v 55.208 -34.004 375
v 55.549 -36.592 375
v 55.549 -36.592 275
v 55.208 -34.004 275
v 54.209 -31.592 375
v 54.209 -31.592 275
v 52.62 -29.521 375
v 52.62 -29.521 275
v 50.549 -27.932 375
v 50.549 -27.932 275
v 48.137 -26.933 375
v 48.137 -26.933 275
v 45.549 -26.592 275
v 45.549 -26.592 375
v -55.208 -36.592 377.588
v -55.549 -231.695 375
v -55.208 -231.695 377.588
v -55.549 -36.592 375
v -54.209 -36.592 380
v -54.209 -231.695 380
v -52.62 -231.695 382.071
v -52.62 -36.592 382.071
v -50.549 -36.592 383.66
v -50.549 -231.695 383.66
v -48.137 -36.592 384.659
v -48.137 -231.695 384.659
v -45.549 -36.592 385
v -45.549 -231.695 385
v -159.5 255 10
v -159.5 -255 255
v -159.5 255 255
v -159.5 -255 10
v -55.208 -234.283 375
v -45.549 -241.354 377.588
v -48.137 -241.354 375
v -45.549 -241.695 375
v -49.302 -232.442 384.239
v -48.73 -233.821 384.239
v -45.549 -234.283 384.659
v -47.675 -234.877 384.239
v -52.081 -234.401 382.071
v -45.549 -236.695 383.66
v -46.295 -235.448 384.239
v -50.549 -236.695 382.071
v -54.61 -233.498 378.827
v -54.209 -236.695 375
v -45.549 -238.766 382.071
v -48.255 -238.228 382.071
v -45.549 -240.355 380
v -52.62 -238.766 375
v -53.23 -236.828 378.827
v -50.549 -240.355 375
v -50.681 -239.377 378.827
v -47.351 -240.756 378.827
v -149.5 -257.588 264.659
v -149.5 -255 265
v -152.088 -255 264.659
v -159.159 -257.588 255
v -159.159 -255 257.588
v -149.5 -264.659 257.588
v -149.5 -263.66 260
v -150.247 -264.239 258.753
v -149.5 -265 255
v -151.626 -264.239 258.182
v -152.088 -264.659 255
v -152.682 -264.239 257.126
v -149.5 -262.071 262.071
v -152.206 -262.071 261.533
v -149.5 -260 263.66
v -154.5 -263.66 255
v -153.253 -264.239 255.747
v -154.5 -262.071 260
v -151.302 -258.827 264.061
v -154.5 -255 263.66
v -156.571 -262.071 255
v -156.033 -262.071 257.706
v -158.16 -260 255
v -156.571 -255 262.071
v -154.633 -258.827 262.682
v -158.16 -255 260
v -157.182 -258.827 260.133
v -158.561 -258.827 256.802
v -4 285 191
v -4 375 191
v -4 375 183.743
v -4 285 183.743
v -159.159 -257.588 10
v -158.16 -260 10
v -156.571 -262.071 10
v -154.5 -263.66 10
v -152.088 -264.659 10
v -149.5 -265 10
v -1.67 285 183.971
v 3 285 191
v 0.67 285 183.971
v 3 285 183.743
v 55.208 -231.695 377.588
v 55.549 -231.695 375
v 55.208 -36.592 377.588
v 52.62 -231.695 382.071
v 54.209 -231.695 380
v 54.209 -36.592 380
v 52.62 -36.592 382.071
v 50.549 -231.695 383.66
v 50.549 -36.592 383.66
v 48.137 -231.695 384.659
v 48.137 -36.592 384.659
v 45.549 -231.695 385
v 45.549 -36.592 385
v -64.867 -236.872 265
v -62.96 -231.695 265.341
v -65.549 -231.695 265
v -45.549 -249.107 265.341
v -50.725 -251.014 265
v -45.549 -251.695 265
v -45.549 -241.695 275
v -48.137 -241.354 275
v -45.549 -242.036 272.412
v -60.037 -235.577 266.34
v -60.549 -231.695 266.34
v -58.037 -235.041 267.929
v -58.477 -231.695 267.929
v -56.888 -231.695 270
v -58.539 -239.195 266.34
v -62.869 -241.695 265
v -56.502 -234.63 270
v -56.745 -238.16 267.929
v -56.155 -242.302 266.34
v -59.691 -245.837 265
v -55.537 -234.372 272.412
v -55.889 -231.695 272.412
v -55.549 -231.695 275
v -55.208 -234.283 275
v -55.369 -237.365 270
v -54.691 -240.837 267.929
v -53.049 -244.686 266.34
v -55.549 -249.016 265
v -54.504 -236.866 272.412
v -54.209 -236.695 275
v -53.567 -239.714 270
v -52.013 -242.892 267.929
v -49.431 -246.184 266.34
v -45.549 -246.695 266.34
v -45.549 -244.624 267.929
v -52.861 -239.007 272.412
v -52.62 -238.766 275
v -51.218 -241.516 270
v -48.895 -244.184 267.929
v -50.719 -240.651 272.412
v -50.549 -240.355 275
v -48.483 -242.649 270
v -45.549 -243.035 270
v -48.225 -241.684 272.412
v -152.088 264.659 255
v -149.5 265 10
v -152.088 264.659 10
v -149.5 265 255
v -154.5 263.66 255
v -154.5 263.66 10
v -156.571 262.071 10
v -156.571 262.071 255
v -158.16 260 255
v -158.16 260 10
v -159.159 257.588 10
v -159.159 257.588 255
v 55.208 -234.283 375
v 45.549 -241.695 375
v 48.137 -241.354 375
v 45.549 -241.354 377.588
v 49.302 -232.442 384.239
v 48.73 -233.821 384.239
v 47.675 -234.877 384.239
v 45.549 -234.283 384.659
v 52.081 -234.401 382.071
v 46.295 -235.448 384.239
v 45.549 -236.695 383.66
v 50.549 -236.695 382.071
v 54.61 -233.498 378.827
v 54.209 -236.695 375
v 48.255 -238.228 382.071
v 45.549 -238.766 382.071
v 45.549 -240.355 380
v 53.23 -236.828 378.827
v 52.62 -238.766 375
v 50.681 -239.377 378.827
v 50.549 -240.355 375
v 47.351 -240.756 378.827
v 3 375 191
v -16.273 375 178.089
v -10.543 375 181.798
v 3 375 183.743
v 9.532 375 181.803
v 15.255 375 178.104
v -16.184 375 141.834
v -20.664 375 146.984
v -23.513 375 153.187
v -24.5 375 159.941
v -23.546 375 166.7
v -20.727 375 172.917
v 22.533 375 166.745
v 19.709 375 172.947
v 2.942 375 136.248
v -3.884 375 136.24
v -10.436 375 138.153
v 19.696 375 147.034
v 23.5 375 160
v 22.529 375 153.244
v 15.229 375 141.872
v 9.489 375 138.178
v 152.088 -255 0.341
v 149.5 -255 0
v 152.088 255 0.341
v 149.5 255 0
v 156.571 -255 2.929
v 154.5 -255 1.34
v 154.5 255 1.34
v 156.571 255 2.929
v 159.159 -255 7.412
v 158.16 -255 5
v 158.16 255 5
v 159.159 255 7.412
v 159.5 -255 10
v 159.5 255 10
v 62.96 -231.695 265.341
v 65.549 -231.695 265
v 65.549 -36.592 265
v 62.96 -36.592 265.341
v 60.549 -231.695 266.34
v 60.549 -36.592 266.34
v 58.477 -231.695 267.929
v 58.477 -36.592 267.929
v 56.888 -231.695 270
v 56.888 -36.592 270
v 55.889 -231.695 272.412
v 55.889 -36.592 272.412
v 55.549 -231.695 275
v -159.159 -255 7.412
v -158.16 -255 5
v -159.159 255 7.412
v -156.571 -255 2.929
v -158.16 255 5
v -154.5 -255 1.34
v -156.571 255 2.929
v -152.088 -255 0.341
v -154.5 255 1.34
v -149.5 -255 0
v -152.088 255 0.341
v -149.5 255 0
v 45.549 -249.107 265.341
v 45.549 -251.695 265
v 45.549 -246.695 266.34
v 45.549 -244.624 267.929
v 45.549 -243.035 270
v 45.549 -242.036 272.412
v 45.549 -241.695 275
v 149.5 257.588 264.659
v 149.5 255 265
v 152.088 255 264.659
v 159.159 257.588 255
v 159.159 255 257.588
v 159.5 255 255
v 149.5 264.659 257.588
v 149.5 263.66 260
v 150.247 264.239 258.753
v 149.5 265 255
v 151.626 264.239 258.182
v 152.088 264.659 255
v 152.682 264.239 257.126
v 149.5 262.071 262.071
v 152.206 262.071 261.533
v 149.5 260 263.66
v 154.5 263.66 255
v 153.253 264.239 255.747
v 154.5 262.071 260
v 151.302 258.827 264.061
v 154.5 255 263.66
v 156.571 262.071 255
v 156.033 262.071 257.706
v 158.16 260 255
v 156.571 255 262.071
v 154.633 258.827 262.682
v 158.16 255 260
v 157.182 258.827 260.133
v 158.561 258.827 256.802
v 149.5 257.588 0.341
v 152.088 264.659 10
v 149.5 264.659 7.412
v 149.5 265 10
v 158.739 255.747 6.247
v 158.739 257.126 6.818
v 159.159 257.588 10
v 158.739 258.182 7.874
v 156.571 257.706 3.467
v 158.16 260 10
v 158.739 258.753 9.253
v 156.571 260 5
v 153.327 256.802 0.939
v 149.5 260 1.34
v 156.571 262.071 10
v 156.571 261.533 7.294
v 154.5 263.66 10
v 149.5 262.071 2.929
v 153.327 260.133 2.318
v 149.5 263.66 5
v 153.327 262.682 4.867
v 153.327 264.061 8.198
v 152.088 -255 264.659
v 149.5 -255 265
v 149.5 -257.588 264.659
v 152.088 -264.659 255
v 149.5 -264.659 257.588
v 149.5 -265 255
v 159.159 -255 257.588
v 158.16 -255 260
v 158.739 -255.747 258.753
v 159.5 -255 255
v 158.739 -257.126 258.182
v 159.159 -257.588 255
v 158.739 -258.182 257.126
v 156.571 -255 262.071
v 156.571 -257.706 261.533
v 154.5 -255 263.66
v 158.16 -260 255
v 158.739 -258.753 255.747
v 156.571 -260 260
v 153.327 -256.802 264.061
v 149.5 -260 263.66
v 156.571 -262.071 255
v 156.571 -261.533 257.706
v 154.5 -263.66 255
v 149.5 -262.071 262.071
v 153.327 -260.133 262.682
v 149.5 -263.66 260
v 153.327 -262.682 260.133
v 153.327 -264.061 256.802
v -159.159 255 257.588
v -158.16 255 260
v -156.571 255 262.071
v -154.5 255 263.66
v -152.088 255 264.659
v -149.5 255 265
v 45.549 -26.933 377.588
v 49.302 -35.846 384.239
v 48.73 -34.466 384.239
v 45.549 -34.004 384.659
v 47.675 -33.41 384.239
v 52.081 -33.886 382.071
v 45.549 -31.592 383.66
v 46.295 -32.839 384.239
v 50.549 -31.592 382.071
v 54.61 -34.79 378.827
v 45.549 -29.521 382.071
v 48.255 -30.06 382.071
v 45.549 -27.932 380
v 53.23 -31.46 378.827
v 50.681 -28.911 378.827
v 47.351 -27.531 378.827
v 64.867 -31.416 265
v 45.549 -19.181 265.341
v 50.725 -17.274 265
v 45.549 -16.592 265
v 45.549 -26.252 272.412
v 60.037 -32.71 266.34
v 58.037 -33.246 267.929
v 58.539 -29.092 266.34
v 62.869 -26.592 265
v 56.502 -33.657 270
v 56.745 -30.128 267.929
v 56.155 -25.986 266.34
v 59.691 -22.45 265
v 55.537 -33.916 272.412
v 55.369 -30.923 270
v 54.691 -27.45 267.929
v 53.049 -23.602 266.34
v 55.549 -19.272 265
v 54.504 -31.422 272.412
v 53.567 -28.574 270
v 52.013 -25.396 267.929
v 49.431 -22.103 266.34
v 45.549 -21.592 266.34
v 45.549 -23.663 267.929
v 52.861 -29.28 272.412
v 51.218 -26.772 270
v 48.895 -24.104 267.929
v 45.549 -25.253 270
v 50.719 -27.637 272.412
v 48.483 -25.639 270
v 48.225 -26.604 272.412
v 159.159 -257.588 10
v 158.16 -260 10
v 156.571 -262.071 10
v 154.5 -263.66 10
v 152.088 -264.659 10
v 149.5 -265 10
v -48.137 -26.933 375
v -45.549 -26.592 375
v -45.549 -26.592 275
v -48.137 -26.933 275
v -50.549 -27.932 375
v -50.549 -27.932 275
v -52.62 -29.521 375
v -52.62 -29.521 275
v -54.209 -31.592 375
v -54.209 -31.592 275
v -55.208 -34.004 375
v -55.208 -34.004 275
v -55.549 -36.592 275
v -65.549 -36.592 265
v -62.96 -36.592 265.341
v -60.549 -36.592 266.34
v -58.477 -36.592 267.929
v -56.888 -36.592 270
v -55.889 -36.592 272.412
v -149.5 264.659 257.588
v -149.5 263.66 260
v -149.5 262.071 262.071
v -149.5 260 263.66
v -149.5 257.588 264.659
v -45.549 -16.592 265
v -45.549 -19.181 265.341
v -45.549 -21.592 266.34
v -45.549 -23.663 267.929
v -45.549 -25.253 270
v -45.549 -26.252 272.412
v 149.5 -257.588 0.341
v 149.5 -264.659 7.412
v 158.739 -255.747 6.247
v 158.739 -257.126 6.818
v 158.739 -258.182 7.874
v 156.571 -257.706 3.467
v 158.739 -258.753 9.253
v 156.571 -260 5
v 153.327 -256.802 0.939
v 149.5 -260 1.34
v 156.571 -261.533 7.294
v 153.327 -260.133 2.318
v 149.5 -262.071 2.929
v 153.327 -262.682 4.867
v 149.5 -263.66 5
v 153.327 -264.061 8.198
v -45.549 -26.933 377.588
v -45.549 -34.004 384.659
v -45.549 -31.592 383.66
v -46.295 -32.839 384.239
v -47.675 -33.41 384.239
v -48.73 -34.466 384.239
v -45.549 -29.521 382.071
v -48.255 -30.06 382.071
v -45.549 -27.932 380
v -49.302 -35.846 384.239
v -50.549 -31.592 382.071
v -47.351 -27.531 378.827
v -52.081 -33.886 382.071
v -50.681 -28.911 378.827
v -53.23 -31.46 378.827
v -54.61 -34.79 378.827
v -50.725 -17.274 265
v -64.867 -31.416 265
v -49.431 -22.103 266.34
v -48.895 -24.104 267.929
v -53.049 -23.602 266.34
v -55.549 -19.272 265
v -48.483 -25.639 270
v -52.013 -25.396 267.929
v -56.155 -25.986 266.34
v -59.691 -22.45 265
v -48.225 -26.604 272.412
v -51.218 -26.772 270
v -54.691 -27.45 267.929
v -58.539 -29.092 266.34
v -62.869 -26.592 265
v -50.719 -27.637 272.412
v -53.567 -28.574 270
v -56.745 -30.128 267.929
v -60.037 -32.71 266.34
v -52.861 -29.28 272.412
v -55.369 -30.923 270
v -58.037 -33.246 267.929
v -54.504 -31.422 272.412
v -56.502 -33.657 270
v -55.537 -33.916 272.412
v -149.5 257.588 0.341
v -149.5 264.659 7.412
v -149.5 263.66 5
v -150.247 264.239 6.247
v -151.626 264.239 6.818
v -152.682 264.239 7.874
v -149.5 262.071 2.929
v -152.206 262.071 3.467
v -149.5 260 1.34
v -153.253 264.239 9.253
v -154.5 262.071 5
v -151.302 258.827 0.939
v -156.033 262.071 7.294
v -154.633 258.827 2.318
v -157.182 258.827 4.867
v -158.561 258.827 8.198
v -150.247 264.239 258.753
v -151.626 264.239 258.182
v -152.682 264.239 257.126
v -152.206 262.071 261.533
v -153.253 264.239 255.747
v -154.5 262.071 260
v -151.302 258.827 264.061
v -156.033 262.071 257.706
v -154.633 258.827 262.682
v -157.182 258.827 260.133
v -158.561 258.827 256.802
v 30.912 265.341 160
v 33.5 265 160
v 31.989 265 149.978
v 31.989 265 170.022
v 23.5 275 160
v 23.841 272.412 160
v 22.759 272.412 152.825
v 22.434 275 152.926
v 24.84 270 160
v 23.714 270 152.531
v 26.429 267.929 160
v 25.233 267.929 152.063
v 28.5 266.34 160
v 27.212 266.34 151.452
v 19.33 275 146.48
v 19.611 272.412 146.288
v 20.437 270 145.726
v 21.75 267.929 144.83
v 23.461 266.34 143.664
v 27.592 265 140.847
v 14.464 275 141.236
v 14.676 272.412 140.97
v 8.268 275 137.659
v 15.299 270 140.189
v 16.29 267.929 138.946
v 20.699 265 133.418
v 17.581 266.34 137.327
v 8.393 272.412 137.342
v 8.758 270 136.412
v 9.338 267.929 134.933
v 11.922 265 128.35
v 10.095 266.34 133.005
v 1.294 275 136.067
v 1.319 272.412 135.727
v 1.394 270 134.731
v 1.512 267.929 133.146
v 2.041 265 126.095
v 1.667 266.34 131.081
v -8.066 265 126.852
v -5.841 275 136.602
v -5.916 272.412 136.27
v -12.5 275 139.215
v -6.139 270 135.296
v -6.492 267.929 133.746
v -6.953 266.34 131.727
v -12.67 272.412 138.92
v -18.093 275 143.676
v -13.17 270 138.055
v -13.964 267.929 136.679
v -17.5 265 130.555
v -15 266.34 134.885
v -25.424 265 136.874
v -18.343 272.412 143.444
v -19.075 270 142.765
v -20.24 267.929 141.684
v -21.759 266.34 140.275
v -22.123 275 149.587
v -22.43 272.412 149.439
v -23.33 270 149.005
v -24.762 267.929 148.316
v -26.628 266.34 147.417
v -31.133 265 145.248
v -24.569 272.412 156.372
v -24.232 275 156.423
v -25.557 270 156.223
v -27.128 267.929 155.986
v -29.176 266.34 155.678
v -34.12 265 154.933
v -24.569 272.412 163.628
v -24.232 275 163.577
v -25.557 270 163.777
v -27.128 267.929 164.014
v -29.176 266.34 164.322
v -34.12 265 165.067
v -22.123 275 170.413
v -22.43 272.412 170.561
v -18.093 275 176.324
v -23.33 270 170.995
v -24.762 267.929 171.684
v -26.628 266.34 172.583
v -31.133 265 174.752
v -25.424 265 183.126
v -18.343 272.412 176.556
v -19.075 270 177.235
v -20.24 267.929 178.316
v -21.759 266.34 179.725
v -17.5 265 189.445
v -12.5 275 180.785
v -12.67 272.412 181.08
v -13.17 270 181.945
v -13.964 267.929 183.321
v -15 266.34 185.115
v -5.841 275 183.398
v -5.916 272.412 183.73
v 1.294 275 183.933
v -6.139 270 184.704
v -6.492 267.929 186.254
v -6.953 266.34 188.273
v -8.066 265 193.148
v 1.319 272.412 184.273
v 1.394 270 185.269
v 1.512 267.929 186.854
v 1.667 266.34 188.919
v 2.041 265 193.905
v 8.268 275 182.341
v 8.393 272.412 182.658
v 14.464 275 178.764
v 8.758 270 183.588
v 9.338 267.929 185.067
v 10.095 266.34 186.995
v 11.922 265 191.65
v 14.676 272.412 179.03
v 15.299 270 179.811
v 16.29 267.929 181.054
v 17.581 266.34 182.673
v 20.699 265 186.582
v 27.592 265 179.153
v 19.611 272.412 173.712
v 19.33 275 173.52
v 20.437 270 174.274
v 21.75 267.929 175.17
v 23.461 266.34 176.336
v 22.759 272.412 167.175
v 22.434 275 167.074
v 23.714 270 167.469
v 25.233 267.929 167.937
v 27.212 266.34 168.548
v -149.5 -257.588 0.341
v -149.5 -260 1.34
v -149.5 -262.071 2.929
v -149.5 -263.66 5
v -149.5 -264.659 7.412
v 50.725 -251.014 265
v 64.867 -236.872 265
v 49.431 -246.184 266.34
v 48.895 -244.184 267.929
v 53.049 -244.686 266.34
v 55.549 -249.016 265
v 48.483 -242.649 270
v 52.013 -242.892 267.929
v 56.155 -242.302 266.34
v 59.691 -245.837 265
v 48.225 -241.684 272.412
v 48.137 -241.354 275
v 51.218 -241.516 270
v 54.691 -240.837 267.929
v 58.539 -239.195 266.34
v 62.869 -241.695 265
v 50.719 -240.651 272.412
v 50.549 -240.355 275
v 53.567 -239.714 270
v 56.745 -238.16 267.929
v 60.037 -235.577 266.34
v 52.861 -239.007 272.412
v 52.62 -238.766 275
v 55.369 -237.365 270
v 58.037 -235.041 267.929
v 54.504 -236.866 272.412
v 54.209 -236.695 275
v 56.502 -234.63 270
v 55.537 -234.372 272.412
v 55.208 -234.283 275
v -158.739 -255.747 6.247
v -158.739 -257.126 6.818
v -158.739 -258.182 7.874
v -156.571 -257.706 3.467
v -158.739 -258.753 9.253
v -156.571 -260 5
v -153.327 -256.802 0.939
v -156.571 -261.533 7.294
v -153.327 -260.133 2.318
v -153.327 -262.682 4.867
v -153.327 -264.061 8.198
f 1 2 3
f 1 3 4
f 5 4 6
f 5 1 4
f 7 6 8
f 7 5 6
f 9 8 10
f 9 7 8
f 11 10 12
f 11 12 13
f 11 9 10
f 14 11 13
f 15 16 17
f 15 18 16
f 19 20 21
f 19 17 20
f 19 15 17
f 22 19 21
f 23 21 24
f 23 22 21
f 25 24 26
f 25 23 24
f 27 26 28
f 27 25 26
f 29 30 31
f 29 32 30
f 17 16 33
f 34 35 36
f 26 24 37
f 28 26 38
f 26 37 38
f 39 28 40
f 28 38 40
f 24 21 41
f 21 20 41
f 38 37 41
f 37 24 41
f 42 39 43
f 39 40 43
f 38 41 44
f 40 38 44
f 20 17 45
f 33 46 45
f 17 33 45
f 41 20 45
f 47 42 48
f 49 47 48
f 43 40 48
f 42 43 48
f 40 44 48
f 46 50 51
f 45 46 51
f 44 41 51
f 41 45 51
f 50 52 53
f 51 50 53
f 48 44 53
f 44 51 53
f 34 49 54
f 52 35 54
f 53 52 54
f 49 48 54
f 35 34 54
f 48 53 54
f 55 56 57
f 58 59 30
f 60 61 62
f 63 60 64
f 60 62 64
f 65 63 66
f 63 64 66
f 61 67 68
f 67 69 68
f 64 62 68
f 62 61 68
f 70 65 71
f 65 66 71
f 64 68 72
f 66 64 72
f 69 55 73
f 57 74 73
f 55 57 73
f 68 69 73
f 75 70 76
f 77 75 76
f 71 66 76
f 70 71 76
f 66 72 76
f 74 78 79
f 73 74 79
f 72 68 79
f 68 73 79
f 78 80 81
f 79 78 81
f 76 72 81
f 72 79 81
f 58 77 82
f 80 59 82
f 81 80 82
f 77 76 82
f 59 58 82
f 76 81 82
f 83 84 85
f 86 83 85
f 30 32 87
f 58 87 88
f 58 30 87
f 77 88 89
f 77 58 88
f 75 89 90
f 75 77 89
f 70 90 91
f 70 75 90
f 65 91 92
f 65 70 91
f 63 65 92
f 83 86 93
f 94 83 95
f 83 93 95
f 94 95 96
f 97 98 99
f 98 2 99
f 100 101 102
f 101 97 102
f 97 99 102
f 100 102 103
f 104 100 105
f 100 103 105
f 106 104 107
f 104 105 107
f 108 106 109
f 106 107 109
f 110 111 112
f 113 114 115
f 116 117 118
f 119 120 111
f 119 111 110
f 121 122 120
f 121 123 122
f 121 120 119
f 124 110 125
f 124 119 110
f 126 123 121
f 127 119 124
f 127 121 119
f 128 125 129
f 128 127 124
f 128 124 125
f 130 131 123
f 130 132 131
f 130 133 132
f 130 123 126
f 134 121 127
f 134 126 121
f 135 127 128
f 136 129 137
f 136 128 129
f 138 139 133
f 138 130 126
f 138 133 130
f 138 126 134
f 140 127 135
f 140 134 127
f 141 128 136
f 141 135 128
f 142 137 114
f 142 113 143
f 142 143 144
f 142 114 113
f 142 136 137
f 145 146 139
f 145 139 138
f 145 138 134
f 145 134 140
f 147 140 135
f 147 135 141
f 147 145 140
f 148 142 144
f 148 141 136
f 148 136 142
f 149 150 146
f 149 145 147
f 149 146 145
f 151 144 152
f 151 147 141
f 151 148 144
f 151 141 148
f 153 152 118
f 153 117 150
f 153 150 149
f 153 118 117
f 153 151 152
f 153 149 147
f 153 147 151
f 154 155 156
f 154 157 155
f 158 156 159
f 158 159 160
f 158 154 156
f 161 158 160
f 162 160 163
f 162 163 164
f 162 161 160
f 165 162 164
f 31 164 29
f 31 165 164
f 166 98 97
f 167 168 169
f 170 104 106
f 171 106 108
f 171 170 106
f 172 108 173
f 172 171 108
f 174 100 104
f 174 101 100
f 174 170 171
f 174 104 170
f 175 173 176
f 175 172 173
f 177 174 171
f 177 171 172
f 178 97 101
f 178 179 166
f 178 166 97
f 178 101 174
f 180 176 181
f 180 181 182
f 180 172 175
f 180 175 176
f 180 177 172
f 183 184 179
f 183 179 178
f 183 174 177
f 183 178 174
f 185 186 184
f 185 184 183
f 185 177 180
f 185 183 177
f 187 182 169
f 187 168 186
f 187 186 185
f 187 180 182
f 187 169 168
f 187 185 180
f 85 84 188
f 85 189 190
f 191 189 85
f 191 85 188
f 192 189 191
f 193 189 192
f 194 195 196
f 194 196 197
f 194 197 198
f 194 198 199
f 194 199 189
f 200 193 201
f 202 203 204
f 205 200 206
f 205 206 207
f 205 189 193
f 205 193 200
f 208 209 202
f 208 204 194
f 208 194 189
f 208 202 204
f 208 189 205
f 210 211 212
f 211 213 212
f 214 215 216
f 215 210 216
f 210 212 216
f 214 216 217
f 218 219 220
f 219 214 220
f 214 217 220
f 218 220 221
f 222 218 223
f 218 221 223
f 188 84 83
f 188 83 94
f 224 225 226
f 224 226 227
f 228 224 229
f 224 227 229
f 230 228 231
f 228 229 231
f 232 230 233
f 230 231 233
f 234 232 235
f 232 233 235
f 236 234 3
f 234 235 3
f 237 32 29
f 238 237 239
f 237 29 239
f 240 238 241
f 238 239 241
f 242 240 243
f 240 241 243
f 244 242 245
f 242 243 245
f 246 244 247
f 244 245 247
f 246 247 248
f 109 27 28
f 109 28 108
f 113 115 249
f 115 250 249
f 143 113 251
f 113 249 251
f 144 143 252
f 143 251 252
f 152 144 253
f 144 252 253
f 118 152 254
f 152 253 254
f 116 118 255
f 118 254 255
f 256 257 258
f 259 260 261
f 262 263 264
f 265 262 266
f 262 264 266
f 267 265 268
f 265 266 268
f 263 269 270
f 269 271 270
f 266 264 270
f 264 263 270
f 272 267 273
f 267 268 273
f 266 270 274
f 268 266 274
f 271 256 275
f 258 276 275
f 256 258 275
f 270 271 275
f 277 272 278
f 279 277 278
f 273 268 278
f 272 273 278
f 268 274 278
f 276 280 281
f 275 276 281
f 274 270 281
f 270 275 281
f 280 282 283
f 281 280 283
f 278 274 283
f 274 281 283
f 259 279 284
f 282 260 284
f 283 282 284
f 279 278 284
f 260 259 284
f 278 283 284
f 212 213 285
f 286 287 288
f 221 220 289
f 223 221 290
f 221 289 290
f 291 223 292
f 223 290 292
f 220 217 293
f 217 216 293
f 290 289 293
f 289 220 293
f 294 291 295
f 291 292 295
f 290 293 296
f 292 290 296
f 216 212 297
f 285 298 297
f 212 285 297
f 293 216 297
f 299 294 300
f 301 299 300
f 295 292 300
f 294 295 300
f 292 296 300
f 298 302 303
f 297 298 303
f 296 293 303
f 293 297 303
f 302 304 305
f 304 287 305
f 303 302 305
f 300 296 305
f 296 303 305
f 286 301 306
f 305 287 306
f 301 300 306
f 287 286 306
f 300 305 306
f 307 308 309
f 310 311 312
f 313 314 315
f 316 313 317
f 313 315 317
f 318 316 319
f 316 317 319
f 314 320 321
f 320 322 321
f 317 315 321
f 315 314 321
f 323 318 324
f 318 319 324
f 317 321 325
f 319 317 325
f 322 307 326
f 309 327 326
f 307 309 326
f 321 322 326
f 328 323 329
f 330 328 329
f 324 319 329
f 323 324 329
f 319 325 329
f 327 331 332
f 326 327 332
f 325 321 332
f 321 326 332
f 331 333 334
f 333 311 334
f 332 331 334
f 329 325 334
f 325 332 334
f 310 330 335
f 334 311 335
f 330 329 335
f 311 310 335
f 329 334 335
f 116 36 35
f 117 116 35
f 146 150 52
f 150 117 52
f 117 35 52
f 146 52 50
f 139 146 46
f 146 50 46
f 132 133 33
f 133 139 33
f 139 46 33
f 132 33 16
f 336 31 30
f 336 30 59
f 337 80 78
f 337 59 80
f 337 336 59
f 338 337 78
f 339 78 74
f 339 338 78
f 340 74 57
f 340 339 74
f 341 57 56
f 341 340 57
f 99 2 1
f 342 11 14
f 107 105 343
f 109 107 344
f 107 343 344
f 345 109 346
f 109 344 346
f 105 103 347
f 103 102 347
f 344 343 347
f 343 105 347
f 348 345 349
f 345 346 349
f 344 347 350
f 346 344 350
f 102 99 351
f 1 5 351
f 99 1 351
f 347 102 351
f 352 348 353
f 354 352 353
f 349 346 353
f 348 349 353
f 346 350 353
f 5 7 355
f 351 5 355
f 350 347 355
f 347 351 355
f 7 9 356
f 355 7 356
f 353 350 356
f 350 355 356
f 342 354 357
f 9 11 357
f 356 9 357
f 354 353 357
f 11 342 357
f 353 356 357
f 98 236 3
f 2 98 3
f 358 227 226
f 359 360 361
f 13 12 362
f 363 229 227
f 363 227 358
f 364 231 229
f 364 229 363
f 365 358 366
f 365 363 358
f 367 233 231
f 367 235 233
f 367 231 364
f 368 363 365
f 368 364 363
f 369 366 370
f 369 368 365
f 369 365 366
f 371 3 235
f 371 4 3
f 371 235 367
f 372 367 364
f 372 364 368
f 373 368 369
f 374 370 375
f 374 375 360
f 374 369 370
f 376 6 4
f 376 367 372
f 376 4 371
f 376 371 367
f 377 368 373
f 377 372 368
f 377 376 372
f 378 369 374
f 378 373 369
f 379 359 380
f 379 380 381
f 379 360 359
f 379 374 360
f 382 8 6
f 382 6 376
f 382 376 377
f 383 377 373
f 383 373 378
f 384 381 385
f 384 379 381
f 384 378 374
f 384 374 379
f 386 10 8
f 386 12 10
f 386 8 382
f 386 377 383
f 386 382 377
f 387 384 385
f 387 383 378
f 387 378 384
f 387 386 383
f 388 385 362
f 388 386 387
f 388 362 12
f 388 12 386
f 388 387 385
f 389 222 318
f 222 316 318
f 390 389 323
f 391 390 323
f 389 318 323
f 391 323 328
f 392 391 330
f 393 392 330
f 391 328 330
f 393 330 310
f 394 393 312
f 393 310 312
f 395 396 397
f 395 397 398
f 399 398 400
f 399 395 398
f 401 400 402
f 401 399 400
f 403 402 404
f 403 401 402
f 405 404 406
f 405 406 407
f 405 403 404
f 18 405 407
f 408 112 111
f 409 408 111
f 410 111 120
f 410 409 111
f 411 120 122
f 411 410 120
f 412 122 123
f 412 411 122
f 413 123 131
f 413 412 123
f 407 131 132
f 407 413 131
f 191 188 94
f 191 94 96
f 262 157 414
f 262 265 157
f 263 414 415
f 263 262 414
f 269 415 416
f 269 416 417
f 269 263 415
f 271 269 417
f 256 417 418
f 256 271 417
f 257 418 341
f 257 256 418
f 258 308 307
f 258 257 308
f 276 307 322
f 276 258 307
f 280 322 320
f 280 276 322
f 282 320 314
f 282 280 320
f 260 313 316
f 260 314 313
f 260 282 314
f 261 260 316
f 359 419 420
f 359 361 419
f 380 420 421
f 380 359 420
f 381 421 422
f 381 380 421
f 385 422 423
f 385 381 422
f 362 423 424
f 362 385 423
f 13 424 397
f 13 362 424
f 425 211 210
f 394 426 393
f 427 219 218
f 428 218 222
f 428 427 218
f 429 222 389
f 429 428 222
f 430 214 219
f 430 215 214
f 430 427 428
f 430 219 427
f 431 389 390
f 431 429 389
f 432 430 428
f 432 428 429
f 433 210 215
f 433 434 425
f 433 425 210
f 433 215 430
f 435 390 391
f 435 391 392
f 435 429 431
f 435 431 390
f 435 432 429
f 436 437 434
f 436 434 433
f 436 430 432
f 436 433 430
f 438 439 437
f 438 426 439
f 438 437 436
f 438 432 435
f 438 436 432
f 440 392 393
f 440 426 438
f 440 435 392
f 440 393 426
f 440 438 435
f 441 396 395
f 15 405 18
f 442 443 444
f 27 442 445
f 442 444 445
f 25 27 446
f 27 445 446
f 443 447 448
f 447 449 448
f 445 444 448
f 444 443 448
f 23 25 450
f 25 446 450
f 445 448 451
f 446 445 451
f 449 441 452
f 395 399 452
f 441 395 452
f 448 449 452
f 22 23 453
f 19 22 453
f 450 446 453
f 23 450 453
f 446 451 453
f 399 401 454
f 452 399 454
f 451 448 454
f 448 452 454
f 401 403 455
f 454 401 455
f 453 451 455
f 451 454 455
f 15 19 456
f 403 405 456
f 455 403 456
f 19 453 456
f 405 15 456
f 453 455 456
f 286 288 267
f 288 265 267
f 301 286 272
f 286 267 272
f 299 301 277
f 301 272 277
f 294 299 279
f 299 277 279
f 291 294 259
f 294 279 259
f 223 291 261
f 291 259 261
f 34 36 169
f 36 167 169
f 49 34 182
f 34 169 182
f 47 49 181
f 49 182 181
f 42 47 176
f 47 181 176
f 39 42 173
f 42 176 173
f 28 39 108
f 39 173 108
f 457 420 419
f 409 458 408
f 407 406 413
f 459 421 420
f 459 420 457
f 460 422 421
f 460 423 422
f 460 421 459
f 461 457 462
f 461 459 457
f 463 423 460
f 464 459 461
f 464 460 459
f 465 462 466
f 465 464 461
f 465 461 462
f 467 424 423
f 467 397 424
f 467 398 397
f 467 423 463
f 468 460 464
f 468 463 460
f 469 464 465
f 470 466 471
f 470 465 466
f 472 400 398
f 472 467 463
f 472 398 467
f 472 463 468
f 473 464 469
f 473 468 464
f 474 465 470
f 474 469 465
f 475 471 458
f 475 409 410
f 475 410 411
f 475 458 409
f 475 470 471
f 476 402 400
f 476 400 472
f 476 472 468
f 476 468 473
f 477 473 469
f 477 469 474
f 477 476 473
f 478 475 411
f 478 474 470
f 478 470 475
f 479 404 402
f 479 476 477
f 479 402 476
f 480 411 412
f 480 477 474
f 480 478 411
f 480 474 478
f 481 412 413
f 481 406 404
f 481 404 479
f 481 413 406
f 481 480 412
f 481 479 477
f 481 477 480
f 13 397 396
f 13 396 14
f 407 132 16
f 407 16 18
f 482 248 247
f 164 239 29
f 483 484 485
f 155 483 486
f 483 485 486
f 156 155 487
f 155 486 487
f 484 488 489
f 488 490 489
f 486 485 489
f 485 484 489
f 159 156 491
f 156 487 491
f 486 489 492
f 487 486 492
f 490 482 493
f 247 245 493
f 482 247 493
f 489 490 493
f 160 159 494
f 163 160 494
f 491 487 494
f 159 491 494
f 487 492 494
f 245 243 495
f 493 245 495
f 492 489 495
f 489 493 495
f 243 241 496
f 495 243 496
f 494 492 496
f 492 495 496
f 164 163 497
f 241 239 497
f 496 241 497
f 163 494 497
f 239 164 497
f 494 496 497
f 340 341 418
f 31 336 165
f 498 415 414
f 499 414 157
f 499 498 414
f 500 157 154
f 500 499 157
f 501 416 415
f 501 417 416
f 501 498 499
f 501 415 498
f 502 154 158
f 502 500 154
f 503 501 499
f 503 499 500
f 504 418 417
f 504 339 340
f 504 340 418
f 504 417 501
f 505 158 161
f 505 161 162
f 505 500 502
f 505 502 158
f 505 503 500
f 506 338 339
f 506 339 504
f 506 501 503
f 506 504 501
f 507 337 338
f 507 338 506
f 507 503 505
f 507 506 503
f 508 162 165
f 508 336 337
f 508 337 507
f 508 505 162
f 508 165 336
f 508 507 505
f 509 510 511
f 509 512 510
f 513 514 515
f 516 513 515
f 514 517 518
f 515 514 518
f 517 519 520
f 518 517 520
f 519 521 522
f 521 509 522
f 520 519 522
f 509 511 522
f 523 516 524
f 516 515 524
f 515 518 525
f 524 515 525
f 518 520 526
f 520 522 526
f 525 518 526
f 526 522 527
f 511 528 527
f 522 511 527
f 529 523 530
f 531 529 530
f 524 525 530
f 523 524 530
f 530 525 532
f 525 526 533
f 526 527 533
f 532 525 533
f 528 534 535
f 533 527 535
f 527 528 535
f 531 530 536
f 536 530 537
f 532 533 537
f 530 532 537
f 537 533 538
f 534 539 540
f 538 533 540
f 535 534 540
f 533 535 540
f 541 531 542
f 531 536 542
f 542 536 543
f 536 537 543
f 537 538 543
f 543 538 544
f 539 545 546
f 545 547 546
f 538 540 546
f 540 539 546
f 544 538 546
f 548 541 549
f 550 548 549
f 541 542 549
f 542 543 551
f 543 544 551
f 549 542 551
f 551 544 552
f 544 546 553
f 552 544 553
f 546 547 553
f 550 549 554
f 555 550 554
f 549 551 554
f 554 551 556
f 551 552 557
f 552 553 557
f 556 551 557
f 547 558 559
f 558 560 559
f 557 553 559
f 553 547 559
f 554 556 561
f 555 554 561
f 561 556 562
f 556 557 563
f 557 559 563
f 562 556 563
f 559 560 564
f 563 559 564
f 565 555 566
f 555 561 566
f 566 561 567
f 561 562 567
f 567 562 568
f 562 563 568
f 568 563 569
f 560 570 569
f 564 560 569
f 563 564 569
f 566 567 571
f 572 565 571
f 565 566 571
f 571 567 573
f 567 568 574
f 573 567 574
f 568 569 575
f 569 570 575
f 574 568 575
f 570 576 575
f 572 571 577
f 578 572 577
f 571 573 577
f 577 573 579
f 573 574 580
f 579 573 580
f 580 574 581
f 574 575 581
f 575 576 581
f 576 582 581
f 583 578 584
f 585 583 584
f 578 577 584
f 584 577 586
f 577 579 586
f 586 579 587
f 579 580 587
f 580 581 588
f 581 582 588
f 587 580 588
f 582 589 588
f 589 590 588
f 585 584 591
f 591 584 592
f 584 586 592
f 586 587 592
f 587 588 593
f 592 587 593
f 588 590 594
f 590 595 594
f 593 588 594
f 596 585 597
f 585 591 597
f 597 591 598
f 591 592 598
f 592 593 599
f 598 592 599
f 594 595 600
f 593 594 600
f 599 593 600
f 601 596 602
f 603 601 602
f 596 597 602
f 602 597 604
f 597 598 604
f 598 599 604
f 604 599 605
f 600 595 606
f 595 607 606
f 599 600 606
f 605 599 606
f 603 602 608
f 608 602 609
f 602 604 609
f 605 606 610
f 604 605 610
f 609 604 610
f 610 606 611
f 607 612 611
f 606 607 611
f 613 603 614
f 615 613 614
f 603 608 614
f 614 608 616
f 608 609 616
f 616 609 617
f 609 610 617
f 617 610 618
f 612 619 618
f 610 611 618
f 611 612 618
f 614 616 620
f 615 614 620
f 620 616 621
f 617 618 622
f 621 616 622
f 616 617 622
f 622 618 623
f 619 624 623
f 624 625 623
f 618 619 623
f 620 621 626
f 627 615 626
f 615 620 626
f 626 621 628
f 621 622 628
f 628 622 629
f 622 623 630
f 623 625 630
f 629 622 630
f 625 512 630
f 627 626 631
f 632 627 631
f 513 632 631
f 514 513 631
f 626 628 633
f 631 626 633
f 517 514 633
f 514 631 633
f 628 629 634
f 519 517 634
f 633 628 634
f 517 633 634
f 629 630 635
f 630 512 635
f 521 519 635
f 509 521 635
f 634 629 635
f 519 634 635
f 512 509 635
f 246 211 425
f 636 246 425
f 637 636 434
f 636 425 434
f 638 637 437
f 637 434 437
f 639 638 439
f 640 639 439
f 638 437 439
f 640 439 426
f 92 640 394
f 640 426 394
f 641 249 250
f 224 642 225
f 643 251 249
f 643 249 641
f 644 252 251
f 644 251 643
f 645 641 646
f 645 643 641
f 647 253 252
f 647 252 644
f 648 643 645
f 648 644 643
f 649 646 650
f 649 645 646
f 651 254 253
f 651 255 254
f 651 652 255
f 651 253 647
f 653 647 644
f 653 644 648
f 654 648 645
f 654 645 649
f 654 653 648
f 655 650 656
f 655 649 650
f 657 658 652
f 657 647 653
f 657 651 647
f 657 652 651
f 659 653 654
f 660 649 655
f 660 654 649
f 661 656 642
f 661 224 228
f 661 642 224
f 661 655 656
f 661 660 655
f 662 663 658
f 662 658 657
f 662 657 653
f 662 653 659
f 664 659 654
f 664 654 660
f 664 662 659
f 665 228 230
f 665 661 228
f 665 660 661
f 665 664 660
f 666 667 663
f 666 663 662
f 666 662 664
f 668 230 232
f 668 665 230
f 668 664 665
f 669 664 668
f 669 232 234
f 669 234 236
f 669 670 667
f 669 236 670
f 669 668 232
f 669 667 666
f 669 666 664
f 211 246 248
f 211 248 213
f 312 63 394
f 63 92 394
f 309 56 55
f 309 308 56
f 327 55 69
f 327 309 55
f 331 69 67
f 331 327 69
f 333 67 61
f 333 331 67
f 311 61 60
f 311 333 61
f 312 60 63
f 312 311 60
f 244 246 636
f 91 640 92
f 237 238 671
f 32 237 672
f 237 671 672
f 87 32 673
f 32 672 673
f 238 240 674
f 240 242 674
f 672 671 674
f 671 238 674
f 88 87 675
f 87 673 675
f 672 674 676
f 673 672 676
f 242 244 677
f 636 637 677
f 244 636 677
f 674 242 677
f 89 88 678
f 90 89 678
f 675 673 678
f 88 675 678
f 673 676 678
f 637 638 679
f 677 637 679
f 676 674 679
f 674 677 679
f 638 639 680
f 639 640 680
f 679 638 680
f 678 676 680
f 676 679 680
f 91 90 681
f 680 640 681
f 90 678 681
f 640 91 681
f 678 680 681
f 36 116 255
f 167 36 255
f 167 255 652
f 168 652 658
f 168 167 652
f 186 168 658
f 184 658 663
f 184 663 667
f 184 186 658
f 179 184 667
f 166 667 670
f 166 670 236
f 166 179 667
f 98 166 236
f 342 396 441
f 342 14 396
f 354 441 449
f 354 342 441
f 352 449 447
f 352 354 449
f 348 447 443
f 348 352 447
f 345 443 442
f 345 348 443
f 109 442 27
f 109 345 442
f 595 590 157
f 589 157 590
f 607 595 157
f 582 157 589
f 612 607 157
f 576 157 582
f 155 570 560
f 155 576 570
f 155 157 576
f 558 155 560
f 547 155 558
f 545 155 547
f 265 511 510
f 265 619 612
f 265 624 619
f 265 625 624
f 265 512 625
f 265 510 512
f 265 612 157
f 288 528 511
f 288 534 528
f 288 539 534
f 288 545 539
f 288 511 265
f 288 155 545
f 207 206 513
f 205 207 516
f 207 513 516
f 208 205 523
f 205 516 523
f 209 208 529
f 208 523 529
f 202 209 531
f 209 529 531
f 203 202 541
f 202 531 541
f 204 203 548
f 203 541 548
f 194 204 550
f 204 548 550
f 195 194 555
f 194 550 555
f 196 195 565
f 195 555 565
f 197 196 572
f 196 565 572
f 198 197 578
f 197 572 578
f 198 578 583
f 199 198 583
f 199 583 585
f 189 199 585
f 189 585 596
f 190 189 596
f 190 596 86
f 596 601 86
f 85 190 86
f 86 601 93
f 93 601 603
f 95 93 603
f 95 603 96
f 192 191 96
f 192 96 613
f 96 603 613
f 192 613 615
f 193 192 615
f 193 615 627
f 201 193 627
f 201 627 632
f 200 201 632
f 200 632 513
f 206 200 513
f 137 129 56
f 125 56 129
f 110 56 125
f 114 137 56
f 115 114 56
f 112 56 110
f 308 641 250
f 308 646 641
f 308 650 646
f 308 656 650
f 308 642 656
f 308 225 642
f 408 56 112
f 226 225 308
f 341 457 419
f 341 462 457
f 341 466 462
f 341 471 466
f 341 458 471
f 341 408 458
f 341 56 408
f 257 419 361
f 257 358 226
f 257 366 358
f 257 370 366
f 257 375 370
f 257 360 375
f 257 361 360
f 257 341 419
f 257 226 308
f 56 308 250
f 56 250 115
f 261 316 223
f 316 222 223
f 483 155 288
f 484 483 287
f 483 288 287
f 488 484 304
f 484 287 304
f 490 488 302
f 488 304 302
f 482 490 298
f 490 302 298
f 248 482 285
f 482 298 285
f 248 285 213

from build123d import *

# Parameters (mm, degrees)
SKETCH1_W           = 319
SKETCH1_H           = 530
BOSS_EXTRUDE1_DEPTH = 265
SKETCH2_W           = 111.097054908
SKETCH2_H           = 215.10280844
BOSS_EXTRUDE2_DEPTH = 120
SKETCH3_R           = 24
BOSS_EXTRUDE3_DEPTH = 110
SKETCH4_W           = 7
SKETCH4_H           = 14
BOSS_EXTRUDE4_DEPTH = 90
FILLET1_R           = 10


with BuildPart() as part:
    # Sketch1 → Boss-Extrude1 (new body)
    with BuildSketch(Plane.XY):
        Rectangle(SKETCH1_W, SKETCH1_H)
    extrude(amount=BOSS_EXTRUDE1_DEPTH)

    # Sketch2 → Boss-Extrude2 (add)
    with BuildSketch(Plane.XY.offset(265)):
        with Locations((0, -134.143784384)):
            Rectangle(SKETCH2_W, SKETCH2_H)
    extrude(amount=BOSS_EXTRUDE2_DEPTH)

    # Sketch3 → Boss-Extrude3 (add)
    with BuildSketch(Plane(origin=(0, 265, 0), x_dir=(1, 0, 0), z_dir=(0, 1, 0))):
        with Locations((-0.5, -160)):
            Circle(SKETCH3_R)
    extrude(amount=BOSS_EXTRUDE3_DEPTH)

    # Sketch4 → Boss-Extrude4 (add)
    with BuildSketch(Plane(origin=(0, 375, 0), x_dir=(1, 0, 0), z_dir=(0, 1, 0))):
        with Locations((-0.5, -184)):
            Rectangle(SKETCH4_W, SKETCH4_H)
    extrude(amount=-BOSS_EXTRUDE4_DEPTH)

    # Fillet1
    fillet1_edges = [part.edges().sort_by_distance(p)[0] for p in [
        (-159.5, 0, 265),
        (0, -265, 265),
        (55.548527454, -134.143784384, 265),
        (55.548527454, -241.695188604, 325),
        (0, -26.592380164, 265),
        (55.548527454, -26.592380164, 325),
        (-55.548527454, -134.143784384, 265),
        (-55.548527454, -26.592380164, 325),
        (0, -241.695188604, 265),
        (-55.548527454, -241.695188604, 325),
        (55.548527454, -134.143784384, 385),
        (0, -26.592380164, 385),
        (-55.548527454, -134.143784384, 385),
        (0, -241.695188604, 385),
        (-24.5, 265, 160),
        (159.5, 0, 265),
        (0, -265, 0),
        (-159.5, 0, 0),
        (0, 265, 0),
        (159.5, 0, 0),
        (0, 265, 265),
        (159.5, -265, 132.5),
        (-159.5, -265, 132.5),
        (-159.5, 265, 132.5),
        (159.5, 265, 132.5),
    ]]
    fillet(fillet1_edges, radius=FILLET1_R)


solid = part.part
